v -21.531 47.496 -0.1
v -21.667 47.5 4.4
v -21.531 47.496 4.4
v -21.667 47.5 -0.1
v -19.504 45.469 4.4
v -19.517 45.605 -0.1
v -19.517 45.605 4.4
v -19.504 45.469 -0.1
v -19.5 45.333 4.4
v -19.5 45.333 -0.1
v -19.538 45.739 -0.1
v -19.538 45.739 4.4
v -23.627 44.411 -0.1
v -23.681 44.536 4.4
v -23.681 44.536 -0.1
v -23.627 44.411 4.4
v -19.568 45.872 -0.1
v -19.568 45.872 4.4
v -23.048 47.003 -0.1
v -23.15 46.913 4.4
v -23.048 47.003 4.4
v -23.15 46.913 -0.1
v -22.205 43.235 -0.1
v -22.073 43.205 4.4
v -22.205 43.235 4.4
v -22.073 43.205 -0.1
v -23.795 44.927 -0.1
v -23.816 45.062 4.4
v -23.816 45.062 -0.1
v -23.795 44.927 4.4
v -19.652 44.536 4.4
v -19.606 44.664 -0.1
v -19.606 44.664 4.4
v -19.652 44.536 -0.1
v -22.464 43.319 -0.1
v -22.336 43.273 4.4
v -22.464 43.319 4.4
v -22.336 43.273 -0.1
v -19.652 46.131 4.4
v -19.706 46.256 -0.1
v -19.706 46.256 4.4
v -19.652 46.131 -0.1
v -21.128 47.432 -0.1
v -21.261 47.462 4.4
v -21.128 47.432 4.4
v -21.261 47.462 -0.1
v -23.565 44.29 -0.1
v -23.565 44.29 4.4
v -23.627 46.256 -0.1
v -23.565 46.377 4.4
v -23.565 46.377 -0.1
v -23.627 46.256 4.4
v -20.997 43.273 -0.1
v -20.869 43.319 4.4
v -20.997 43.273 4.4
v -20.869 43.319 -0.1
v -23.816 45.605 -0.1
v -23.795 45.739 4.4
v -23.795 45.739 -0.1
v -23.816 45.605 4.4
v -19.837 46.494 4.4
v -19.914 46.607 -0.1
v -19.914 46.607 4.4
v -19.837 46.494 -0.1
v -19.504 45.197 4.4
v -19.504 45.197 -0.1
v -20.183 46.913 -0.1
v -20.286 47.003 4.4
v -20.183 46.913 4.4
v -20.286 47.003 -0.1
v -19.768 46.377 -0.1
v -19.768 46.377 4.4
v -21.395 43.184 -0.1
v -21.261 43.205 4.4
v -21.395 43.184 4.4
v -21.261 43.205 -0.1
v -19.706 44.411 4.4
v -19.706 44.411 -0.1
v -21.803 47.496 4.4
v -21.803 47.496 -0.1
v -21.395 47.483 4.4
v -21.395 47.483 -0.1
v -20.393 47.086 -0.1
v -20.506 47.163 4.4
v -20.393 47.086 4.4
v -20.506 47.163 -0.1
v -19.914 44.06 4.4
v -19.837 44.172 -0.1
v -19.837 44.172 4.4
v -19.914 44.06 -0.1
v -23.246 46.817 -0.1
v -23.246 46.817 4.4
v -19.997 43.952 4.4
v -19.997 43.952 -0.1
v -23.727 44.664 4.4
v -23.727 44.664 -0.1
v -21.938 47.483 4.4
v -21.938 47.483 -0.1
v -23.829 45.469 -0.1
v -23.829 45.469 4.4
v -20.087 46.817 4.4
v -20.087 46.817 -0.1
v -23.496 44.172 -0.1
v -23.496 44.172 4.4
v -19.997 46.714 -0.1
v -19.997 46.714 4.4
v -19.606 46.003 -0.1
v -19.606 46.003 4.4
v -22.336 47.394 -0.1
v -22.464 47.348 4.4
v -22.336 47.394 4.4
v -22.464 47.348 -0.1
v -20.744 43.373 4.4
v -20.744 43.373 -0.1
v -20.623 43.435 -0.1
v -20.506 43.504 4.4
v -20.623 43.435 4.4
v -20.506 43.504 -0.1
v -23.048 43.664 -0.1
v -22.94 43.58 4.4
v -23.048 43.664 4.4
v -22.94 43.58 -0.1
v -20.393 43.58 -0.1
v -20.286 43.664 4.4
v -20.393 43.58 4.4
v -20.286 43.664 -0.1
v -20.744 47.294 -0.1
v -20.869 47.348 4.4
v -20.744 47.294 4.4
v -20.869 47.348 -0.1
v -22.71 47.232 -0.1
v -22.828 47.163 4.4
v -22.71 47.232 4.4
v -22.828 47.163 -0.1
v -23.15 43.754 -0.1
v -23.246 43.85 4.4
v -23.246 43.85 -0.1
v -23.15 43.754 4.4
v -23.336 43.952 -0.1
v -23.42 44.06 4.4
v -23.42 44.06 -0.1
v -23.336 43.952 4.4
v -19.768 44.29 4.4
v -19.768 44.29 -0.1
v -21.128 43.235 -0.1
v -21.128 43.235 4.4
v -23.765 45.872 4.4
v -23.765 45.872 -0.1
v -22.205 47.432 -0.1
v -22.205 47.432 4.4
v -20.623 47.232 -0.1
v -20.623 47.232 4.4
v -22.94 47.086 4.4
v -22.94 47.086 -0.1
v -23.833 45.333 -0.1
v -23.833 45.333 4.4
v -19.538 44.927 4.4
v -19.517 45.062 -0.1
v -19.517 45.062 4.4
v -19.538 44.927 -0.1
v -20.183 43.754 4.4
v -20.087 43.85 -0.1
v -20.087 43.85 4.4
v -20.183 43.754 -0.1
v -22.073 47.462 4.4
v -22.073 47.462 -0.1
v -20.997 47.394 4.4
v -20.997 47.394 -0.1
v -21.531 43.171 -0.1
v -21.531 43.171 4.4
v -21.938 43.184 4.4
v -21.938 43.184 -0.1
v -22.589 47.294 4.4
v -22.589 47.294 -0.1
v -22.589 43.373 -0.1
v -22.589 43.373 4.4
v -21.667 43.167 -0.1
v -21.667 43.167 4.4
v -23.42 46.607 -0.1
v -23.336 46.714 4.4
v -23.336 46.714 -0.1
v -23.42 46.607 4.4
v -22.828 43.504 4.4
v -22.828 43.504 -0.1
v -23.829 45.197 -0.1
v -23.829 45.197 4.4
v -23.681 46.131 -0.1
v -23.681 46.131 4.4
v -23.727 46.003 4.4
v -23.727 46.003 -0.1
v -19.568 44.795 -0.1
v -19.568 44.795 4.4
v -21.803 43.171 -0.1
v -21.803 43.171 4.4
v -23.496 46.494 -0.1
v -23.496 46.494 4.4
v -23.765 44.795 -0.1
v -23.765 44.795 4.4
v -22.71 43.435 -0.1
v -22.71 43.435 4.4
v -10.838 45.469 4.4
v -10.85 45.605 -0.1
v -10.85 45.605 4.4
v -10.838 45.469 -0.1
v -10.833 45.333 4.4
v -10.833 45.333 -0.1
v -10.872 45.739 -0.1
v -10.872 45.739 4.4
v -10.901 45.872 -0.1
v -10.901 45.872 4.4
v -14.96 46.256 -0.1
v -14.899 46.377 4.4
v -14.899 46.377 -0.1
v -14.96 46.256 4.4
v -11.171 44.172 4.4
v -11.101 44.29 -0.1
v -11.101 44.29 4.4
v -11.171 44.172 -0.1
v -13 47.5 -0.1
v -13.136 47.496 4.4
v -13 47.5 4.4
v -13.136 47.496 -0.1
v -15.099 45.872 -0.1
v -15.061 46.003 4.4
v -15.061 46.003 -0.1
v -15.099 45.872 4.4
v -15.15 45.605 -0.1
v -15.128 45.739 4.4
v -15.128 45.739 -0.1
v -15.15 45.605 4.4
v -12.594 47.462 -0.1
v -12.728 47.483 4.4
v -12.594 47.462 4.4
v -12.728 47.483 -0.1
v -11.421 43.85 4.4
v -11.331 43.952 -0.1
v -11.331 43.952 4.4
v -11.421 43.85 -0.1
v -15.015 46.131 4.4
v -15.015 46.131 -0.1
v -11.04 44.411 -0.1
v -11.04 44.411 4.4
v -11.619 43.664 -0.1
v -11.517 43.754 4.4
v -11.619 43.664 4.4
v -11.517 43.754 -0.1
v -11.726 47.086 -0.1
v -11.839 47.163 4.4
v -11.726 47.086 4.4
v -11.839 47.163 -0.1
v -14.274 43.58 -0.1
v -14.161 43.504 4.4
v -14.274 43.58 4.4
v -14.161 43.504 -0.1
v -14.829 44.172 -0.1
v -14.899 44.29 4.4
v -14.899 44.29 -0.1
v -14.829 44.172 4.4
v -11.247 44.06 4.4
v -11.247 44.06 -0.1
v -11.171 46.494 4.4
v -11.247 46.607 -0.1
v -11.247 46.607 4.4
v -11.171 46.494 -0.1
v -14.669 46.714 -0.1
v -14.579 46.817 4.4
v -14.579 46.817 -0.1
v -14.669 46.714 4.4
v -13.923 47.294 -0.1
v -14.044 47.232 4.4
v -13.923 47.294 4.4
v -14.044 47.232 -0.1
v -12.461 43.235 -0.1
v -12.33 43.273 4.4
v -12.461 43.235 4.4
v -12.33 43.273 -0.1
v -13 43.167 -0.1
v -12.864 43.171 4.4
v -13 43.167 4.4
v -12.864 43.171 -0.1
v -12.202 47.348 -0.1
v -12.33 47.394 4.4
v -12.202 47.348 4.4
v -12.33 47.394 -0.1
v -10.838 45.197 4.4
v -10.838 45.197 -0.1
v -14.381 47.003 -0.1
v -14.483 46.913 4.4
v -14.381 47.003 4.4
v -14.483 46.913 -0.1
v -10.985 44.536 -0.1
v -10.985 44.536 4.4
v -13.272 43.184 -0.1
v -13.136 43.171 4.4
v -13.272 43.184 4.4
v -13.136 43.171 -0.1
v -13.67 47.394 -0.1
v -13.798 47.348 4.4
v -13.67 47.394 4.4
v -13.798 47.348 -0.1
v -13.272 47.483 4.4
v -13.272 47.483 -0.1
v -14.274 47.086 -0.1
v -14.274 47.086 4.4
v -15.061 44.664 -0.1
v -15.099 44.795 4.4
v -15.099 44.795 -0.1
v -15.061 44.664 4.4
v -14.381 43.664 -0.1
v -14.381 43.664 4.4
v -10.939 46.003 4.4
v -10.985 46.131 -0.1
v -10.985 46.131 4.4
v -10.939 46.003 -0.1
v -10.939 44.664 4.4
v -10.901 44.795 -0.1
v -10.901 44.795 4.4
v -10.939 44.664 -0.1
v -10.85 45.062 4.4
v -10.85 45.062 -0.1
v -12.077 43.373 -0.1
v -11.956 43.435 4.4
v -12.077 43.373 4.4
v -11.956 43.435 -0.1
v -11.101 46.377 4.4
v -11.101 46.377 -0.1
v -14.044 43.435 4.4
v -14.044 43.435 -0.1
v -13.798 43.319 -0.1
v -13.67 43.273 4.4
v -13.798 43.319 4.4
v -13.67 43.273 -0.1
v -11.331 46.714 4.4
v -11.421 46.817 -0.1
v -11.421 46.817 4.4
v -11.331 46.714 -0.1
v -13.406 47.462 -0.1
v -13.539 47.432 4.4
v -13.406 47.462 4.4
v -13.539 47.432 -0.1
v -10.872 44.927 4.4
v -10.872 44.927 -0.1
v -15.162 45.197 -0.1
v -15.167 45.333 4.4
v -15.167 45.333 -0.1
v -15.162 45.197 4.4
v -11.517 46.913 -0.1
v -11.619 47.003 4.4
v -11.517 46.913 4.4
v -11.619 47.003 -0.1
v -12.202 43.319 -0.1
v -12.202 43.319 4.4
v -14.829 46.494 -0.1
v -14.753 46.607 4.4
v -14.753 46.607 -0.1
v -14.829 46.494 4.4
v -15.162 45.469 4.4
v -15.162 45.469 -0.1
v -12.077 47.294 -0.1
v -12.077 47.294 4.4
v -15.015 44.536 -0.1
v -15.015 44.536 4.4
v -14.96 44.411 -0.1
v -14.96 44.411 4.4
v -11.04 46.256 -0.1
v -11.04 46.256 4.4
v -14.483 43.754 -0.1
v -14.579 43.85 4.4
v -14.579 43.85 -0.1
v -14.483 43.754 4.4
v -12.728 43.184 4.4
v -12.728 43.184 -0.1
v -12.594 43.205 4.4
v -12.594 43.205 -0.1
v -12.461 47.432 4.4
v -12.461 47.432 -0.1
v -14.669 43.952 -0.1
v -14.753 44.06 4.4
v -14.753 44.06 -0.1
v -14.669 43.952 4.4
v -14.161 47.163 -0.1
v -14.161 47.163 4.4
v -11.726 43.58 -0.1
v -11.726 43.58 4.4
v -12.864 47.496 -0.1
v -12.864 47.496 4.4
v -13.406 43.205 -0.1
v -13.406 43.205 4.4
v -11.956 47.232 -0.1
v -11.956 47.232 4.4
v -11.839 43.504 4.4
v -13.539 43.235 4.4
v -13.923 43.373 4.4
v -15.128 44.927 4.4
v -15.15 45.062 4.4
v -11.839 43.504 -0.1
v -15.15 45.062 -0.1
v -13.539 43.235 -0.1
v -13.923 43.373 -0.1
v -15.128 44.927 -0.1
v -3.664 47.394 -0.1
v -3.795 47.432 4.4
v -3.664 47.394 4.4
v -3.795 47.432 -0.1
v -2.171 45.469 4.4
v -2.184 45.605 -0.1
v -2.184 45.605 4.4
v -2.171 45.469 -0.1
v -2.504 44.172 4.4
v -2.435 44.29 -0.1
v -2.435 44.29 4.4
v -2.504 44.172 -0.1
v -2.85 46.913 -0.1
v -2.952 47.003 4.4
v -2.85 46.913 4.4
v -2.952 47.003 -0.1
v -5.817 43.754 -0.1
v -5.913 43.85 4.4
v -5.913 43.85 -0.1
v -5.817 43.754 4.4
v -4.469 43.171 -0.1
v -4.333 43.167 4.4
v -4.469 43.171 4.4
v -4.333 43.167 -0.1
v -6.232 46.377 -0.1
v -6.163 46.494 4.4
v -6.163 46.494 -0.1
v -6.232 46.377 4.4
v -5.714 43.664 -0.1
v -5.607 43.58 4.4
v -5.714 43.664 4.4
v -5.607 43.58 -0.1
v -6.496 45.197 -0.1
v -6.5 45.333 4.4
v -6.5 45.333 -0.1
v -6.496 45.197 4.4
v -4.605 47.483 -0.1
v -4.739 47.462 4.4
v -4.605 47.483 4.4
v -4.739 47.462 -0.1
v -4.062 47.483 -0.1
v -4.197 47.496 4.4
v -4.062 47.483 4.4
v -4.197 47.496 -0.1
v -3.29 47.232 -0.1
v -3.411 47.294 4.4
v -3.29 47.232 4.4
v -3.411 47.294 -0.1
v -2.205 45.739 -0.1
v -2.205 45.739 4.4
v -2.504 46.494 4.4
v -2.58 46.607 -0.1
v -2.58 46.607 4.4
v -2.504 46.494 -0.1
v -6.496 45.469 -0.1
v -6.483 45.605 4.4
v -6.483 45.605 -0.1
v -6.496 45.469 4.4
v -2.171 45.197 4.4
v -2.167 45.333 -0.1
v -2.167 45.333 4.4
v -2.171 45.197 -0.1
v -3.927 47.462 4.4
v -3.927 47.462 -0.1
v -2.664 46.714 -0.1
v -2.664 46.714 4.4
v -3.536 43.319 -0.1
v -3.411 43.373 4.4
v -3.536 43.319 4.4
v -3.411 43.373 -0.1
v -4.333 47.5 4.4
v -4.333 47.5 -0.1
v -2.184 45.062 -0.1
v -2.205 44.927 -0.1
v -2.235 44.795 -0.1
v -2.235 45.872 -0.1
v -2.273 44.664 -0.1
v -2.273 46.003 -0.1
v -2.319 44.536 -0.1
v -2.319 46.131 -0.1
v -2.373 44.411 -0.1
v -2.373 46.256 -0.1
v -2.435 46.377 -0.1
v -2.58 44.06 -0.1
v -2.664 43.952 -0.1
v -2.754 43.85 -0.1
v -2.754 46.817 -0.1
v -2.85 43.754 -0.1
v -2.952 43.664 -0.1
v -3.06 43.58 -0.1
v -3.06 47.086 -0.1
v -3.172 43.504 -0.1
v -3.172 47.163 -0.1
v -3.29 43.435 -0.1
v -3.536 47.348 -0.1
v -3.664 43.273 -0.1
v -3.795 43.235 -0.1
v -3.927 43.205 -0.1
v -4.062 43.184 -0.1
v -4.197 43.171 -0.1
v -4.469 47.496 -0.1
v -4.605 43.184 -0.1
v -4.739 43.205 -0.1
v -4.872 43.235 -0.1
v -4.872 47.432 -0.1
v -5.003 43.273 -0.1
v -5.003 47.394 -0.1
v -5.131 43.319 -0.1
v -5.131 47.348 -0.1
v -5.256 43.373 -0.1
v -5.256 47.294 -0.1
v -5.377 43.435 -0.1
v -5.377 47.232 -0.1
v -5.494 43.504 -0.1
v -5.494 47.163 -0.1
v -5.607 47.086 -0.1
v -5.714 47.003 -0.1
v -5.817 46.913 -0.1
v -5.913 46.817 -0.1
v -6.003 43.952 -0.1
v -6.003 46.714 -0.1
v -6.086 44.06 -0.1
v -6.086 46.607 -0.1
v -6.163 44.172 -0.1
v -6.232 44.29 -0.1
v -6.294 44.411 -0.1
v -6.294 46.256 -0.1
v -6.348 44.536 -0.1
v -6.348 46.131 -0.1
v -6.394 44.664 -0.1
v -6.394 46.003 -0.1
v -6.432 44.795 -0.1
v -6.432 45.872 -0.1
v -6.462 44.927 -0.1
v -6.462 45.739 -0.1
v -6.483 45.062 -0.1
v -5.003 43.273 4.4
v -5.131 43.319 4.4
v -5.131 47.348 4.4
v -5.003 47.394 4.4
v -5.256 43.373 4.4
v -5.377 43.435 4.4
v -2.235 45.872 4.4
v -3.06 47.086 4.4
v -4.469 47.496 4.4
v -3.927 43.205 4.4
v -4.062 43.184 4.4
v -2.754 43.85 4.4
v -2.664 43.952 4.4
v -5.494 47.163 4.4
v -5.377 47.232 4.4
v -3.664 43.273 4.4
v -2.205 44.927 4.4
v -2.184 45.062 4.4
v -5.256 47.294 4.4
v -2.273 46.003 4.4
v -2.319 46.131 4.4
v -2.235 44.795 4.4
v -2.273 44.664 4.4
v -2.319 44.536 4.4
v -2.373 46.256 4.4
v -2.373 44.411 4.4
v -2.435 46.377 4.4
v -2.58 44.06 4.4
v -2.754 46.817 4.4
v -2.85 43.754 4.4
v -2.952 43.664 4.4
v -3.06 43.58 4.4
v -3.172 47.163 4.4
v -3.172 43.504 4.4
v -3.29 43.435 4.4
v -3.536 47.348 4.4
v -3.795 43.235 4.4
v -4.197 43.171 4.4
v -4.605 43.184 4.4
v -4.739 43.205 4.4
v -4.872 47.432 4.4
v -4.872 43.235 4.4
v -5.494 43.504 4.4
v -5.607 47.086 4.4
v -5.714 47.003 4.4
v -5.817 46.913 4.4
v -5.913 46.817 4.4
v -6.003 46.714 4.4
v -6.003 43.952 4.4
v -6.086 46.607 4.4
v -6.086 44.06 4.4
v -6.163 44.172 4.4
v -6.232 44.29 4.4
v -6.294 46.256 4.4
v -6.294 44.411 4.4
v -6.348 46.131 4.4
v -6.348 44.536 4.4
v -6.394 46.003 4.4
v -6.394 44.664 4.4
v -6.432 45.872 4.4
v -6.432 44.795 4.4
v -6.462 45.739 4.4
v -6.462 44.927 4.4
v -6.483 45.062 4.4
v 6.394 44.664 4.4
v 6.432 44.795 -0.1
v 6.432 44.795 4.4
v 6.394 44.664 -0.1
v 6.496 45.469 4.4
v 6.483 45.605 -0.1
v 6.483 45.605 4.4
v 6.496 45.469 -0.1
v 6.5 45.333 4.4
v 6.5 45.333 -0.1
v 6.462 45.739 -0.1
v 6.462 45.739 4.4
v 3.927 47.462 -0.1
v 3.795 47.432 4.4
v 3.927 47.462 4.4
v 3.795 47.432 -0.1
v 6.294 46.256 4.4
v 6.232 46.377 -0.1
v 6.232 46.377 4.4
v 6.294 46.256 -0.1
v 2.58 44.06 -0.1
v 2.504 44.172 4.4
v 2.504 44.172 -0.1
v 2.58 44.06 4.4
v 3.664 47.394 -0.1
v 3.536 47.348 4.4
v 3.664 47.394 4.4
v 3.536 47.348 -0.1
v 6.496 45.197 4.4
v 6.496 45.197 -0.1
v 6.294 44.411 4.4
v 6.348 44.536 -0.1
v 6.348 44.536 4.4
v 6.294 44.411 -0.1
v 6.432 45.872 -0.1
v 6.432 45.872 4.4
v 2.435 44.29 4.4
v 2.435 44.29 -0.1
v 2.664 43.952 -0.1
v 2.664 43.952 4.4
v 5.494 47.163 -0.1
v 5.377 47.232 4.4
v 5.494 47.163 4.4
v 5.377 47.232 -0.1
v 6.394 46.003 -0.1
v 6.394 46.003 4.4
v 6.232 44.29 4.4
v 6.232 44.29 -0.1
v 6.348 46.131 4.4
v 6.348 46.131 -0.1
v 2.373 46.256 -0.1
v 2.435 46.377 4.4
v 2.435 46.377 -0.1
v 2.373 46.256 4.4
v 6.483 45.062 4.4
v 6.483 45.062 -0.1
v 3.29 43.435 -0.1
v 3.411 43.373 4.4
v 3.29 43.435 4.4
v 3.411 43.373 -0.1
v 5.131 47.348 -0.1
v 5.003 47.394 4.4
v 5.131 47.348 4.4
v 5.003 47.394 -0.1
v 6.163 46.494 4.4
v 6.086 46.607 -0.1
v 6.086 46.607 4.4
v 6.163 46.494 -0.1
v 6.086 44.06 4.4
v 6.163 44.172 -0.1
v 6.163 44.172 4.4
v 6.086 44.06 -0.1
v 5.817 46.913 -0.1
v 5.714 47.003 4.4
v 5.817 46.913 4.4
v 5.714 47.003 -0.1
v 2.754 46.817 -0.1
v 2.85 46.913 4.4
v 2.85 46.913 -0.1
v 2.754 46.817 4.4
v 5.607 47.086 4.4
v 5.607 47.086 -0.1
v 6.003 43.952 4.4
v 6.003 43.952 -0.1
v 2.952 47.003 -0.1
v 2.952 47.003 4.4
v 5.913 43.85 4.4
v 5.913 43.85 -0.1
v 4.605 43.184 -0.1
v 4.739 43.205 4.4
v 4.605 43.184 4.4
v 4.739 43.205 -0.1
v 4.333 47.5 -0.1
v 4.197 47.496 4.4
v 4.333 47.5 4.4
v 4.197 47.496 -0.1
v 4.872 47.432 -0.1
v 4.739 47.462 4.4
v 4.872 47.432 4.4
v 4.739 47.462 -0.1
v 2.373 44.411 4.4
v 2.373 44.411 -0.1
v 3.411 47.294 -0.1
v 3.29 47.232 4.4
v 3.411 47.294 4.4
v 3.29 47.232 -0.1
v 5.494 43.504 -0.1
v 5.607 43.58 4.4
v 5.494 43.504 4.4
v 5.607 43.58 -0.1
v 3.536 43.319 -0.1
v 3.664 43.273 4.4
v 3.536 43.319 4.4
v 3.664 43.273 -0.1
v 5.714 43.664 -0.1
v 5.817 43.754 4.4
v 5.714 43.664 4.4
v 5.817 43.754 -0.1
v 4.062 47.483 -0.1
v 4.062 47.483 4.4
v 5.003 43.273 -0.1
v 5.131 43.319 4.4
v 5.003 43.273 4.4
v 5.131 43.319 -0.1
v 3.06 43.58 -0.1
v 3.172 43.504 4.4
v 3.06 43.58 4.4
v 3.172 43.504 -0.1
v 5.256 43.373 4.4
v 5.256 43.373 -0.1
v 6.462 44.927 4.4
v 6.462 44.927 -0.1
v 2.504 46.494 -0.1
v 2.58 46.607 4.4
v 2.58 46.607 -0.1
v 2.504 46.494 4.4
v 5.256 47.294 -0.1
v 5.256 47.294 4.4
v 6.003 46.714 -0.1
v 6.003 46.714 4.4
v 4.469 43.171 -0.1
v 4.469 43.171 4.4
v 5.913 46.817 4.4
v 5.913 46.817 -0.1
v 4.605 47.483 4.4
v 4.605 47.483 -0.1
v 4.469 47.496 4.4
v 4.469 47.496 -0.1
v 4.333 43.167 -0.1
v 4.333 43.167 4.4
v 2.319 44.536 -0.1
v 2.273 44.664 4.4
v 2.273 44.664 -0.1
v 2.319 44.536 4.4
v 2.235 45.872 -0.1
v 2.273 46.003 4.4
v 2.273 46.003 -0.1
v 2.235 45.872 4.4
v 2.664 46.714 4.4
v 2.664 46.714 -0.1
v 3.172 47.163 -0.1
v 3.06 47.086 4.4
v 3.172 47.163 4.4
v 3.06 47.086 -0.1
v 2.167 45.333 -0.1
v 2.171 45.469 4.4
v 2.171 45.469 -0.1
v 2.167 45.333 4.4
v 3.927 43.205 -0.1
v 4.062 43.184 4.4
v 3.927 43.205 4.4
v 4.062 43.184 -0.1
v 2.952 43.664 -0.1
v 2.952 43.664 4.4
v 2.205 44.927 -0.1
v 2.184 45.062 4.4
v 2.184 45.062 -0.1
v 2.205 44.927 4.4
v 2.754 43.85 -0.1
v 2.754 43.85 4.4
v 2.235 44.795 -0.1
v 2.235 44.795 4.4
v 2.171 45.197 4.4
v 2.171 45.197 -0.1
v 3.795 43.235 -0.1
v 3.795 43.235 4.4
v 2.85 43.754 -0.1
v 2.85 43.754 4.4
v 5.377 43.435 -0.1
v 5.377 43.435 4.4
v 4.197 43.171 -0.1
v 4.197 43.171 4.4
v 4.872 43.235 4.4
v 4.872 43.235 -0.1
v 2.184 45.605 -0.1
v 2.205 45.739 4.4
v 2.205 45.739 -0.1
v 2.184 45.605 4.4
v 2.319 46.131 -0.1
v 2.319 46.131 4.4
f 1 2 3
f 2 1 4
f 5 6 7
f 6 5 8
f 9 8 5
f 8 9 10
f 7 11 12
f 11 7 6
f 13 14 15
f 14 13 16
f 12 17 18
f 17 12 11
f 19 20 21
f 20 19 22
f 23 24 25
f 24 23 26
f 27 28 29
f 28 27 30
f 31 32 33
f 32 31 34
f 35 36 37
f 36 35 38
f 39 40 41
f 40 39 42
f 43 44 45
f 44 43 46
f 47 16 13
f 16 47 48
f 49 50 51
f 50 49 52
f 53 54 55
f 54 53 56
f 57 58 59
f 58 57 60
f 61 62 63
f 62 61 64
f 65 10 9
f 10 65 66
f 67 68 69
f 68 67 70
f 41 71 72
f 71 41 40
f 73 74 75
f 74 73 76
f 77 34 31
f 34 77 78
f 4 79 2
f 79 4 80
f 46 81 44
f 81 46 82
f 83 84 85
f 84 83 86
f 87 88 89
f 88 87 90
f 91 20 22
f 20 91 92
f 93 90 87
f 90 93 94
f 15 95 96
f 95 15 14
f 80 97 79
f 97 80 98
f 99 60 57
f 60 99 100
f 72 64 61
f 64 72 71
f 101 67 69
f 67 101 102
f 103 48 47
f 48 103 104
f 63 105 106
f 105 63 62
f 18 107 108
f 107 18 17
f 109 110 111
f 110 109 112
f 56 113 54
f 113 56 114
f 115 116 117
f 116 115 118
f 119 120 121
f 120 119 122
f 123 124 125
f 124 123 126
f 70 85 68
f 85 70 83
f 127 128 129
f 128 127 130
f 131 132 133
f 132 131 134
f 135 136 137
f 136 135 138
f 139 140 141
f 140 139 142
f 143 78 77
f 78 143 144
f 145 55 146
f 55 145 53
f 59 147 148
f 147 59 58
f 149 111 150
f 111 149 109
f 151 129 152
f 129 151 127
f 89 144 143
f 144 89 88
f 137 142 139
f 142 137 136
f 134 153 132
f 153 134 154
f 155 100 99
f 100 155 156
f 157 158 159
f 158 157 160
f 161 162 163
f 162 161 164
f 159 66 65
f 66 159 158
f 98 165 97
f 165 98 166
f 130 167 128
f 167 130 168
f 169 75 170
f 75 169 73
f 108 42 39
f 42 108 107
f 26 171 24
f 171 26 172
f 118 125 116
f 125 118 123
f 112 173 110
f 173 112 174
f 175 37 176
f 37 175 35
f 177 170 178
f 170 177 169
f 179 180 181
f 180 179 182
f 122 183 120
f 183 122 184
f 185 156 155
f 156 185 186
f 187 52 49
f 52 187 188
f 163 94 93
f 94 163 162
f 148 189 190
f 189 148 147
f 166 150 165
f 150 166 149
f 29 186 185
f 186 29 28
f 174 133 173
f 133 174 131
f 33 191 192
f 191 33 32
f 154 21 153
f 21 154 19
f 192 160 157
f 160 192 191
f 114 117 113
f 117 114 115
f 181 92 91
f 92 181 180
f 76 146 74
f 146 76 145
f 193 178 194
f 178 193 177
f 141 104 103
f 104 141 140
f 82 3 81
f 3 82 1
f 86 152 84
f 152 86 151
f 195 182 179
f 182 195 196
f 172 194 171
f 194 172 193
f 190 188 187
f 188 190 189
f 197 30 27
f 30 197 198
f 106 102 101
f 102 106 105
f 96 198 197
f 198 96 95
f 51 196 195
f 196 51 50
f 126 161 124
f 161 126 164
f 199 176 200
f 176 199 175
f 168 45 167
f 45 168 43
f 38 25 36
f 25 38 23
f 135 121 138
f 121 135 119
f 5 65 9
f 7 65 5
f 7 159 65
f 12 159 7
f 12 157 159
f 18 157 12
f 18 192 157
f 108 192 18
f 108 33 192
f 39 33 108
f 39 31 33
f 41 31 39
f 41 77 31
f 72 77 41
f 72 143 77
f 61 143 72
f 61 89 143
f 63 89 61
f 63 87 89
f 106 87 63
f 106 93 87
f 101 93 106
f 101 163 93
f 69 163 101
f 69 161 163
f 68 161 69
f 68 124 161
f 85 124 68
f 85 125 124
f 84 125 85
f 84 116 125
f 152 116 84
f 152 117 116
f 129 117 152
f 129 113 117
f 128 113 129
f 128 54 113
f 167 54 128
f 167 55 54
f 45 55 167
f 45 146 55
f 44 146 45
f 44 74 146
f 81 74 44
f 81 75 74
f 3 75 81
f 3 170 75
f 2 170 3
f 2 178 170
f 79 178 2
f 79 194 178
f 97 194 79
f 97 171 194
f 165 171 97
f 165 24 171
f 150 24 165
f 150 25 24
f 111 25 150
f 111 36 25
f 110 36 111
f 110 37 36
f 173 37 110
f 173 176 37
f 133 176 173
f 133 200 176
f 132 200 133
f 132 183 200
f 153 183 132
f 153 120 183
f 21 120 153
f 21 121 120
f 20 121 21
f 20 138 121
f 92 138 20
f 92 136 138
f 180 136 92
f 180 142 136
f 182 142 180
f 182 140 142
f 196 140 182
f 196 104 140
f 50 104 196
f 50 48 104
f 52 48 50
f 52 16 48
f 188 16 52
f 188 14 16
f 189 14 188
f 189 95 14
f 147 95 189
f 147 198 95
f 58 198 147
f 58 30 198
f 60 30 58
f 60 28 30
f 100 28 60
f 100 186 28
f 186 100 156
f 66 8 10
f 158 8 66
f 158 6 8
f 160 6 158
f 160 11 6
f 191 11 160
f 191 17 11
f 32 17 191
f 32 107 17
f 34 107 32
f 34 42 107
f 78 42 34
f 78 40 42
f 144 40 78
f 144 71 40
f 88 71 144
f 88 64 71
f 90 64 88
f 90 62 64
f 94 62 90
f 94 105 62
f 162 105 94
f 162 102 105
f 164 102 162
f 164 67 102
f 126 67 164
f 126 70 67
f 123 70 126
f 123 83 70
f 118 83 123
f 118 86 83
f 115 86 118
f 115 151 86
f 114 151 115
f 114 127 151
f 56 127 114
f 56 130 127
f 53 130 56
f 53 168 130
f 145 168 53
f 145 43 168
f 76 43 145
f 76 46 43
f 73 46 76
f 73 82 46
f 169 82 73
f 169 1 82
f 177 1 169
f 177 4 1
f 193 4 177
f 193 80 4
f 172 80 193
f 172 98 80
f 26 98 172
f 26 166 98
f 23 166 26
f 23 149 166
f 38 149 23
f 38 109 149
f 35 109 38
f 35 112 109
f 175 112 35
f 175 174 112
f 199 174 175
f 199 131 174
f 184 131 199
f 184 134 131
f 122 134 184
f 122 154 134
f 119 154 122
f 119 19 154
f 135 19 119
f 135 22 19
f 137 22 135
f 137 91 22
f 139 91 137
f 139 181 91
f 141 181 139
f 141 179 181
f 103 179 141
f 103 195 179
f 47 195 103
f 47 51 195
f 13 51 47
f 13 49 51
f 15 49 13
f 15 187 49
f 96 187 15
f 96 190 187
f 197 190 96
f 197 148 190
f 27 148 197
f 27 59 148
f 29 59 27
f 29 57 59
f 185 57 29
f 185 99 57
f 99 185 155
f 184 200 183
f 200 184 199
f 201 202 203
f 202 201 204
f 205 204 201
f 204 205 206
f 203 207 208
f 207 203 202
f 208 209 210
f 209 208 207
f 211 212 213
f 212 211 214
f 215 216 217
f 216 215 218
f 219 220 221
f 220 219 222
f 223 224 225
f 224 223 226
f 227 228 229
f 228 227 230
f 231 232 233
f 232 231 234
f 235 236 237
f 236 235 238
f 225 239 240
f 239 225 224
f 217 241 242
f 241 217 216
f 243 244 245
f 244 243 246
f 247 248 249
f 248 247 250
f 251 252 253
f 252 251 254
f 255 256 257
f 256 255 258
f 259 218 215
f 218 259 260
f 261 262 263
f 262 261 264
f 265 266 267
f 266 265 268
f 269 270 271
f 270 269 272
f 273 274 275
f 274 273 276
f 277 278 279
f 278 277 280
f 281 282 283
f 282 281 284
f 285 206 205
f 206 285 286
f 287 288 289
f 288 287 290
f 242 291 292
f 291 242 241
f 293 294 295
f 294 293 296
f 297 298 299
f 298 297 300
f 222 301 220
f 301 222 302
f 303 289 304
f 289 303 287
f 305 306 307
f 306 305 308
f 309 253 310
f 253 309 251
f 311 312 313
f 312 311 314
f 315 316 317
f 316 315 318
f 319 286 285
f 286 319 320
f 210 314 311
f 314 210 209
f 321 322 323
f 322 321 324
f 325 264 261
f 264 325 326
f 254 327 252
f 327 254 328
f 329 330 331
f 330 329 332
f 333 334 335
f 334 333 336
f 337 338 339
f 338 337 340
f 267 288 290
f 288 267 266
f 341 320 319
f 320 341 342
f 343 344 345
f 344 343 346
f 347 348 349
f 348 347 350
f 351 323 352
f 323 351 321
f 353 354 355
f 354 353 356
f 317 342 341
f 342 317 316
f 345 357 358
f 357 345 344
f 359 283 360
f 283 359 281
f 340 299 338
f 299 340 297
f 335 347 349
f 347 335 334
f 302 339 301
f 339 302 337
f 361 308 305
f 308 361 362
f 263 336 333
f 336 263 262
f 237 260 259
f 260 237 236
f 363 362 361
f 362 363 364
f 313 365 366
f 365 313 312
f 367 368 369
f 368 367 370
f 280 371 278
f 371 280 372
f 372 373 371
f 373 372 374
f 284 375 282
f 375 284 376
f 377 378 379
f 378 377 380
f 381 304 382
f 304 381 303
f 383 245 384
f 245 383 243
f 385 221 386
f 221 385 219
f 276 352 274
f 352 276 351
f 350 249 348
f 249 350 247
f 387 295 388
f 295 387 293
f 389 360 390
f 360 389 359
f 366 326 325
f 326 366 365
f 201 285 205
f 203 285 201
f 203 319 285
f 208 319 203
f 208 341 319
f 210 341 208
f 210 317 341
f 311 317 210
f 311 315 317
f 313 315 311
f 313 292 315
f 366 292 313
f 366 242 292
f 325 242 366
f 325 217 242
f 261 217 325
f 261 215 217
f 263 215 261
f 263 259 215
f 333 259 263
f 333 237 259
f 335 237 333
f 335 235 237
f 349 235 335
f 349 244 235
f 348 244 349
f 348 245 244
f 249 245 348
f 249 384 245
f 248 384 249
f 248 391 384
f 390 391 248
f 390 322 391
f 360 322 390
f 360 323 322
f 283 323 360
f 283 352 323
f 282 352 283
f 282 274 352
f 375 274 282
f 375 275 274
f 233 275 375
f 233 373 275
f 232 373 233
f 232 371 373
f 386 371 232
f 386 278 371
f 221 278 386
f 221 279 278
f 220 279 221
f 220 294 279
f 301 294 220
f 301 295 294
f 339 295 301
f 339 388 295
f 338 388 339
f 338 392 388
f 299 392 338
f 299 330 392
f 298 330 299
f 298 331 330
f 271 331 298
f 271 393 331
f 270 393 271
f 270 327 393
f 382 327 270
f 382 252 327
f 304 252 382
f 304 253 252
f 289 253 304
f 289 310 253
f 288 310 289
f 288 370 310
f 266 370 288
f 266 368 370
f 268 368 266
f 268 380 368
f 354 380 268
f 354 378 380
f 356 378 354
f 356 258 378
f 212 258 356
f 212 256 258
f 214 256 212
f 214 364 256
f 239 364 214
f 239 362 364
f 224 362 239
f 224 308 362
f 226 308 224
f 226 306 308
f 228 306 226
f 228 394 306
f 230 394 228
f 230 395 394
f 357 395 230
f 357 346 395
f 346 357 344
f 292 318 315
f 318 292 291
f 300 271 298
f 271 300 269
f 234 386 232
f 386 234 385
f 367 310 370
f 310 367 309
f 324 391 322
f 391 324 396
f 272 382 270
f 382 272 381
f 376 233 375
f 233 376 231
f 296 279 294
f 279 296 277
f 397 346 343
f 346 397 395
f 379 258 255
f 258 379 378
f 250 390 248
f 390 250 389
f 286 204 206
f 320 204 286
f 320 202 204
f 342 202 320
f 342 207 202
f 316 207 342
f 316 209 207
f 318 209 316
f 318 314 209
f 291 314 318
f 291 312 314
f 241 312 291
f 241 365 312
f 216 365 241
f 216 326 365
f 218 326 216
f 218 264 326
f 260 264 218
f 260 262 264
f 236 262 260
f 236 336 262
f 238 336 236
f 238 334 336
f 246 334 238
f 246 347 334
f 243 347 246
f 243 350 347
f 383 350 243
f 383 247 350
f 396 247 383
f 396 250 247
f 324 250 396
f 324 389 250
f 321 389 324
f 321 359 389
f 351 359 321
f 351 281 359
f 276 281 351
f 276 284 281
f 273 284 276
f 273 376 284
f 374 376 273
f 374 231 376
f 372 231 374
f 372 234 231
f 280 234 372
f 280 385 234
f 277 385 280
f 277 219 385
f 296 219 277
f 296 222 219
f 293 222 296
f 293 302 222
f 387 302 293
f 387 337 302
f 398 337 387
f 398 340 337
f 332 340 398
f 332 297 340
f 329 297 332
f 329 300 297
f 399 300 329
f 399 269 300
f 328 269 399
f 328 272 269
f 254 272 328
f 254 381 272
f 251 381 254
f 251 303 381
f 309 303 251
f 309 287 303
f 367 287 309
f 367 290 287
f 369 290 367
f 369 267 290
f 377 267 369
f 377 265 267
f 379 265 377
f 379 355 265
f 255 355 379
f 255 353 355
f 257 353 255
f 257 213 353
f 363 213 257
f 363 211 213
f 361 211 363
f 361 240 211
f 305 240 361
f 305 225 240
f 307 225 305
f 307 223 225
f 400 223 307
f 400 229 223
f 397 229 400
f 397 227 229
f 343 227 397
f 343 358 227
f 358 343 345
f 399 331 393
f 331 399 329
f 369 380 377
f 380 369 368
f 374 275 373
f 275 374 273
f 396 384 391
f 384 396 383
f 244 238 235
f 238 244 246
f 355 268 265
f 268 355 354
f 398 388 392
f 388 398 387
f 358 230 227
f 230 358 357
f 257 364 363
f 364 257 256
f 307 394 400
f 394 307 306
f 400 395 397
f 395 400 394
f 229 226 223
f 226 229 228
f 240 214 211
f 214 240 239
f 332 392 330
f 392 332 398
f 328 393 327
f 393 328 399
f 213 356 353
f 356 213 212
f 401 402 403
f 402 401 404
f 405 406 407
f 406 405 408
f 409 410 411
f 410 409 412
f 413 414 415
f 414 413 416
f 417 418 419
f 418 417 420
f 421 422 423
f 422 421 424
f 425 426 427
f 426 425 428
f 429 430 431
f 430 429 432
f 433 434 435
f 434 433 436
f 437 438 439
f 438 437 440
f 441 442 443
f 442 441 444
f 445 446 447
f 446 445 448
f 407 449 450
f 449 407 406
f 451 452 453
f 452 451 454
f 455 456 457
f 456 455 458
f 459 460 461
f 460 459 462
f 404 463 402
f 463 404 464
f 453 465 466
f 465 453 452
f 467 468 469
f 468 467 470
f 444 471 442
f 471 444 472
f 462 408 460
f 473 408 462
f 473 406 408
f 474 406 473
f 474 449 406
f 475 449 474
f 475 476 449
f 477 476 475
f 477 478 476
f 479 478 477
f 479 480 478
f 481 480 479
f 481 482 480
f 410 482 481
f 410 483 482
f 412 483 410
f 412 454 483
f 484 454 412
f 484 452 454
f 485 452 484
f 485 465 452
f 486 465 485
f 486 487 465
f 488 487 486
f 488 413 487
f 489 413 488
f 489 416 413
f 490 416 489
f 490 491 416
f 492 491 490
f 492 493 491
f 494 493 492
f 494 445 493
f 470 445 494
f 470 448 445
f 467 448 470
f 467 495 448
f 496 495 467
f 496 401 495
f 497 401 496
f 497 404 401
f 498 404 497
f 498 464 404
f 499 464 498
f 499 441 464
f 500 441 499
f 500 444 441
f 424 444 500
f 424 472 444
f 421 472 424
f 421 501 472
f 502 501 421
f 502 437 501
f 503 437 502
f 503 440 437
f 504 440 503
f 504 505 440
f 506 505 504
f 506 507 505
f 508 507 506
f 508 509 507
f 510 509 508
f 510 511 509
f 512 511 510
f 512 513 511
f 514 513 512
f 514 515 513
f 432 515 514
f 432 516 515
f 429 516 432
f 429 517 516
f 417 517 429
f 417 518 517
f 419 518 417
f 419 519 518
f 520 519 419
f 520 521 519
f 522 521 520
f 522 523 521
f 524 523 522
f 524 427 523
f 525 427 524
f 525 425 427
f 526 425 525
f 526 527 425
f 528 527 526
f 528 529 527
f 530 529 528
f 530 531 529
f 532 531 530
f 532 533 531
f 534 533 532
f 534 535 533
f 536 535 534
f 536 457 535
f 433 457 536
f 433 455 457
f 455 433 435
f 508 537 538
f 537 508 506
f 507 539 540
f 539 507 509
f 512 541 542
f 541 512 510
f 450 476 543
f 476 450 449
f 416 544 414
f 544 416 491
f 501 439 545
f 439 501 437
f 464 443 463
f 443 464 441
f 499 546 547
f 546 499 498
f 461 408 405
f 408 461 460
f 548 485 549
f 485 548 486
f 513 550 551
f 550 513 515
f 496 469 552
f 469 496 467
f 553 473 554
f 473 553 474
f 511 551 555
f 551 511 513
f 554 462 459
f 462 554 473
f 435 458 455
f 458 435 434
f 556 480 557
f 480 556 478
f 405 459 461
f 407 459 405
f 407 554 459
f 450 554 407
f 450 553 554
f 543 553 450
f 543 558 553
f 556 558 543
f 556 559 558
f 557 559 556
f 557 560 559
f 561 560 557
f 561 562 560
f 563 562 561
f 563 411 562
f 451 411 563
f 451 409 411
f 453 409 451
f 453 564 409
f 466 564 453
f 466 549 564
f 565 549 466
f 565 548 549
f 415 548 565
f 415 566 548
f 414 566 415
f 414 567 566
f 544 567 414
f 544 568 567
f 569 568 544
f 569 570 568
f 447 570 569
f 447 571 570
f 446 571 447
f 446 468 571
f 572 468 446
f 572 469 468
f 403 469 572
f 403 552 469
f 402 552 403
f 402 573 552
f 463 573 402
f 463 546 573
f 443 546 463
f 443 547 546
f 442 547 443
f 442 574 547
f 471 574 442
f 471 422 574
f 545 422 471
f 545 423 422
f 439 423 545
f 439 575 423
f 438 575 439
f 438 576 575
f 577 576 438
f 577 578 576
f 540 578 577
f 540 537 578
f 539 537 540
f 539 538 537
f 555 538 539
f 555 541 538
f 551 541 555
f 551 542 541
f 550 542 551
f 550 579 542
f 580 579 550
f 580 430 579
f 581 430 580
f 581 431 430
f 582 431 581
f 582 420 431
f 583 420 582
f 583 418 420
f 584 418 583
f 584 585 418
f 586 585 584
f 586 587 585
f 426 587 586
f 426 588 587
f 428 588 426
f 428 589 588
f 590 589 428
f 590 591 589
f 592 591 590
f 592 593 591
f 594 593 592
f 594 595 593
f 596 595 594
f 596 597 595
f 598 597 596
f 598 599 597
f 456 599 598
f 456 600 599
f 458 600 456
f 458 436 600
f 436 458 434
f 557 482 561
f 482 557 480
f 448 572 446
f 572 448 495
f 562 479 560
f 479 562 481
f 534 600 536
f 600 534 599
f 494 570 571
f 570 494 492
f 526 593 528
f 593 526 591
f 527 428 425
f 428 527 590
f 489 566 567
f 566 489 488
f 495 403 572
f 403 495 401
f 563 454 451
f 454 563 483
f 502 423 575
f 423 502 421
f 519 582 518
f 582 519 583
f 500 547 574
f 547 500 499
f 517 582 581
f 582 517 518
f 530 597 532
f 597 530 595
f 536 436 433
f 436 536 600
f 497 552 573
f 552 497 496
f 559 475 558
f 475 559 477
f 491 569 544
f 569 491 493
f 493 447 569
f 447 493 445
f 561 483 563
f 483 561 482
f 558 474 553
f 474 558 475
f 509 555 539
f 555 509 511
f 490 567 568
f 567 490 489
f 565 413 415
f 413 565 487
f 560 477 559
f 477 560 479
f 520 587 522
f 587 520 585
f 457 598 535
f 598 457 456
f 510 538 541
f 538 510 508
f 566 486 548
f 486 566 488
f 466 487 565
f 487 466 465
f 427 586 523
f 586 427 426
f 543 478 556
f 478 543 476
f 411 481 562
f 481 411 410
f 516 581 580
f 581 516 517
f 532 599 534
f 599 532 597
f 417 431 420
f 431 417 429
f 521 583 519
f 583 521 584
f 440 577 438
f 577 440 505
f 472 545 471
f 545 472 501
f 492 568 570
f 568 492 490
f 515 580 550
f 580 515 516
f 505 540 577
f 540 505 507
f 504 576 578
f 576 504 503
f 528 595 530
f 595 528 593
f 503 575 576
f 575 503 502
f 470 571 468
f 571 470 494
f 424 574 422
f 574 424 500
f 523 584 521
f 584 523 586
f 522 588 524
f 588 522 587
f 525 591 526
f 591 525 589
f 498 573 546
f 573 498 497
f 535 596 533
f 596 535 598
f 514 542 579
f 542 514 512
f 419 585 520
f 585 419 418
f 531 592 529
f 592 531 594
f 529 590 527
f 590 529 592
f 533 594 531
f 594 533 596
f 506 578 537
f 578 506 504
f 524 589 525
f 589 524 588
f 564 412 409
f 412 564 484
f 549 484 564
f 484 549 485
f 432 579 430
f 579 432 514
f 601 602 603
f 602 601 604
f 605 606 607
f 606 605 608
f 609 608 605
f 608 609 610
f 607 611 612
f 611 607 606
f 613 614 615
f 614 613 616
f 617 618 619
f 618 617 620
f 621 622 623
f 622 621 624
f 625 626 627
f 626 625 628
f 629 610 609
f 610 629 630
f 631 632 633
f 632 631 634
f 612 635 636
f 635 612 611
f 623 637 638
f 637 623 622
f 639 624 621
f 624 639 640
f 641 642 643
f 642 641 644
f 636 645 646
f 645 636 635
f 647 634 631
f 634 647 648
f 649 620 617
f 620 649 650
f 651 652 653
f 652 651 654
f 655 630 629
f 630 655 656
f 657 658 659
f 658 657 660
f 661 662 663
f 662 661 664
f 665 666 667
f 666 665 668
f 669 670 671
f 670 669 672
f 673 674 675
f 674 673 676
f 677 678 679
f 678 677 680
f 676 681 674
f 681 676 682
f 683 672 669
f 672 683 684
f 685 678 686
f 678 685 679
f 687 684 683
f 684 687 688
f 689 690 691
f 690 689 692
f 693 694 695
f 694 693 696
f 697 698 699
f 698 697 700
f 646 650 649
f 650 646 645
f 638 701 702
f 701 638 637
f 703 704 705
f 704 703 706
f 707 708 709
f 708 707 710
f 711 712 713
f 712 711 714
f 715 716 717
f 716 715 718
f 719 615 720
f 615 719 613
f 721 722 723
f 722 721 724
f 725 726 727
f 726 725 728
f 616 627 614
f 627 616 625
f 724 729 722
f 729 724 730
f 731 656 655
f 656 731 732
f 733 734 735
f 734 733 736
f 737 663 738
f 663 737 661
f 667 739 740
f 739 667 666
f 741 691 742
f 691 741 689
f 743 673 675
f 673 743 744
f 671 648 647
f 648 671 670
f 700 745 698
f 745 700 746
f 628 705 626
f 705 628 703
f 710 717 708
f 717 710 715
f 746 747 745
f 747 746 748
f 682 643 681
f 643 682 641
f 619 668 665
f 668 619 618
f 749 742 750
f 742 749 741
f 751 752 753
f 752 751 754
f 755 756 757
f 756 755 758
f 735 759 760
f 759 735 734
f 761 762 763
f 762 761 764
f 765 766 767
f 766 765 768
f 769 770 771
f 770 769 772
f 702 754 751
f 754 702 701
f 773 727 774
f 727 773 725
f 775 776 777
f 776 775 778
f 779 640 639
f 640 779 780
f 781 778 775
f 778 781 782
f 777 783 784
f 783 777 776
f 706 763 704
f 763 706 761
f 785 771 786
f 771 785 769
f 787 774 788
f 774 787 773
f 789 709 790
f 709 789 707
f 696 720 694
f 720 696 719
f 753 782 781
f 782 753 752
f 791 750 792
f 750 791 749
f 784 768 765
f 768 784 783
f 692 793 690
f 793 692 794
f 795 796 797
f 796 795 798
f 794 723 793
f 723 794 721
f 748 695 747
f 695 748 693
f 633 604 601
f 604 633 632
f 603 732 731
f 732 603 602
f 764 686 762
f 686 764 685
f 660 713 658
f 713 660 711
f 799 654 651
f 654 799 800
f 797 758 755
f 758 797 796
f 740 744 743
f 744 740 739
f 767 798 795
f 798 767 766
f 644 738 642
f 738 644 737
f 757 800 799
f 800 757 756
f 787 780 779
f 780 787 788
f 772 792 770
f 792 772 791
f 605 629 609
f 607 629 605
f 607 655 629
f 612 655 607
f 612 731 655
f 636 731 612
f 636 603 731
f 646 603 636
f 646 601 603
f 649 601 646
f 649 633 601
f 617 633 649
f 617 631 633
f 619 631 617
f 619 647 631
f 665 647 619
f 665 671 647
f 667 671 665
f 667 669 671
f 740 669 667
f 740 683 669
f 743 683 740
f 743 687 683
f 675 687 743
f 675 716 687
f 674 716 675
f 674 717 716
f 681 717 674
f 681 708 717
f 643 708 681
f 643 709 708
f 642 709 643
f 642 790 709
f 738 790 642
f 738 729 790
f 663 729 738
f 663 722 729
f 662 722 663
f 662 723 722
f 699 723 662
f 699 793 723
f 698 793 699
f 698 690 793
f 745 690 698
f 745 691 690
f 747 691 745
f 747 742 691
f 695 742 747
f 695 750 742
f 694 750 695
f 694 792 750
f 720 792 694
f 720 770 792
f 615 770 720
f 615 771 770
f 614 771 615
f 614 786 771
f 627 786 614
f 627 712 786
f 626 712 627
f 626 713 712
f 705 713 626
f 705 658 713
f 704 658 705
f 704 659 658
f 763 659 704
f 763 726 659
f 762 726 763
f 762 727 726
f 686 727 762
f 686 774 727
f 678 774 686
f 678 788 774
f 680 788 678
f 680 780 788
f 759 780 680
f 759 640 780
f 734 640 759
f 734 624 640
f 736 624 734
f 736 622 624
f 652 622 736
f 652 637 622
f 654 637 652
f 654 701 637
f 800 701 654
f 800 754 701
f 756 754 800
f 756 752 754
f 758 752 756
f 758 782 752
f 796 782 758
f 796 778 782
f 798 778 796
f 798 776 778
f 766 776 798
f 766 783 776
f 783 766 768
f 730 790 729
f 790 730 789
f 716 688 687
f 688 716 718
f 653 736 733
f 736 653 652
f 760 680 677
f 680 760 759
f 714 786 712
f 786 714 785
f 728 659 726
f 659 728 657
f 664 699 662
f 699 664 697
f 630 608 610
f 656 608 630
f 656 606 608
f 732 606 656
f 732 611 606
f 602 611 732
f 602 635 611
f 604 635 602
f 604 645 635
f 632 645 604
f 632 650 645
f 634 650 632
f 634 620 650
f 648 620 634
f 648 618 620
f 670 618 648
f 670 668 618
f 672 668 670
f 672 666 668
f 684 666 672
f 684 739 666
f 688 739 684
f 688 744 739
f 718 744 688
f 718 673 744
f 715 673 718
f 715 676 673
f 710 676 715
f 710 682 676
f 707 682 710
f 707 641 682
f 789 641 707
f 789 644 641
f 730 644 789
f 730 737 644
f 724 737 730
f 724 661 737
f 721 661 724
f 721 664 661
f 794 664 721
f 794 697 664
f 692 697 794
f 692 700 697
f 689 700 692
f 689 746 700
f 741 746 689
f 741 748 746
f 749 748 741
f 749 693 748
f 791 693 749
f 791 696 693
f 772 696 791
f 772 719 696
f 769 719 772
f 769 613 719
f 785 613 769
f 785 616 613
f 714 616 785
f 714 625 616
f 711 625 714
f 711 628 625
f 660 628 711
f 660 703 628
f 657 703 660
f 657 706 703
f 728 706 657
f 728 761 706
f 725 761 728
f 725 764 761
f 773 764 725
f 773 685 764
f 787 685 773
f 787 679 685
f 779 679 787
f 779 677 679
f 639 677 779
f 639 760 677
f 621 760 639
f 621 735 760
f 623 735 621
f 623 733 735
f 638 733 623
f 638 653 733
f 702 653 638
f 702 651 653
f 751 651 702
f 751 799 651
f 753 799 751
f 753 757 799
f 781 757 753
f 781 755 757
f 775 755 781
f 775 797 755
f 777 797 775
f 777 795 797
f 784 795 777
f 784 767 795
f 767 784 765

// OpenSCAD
$fn=100;
fit=0.3;

//sabonete=[95,55];
//sabonete=[100,60]; //Claudia
sabonete=[80,50];  //Gabi
sl=sabonete[0];
sw=sabonete[1];
l=sl+2;
w=sw+2; 
pos=1;

h=3;
div=6;
slot=4;
t=(l/div)-slot;
echo("T: ");
echo(t);
/*********/
v=l-(t*div);
//slot=v/(div-1);
s=t+slot;
bh=4;
bw=8;
bl=l-t;
td=0; //top dif
c=25; //top curve
echo(slot);
fh=3;
dw=w/2-w/6-bw/2;
dl=s*2+t;
print=1;

// Sabonete
//%translate([-sw/2, -sl/2, h*3]) cube([sw,sl,20]);

//color([.6,1,0.6])
/**
color("orange")
if(print == 1){ 
    saboneteira6();
}else{    
    translate([0,0,fh]) 
    saboneteira6();
}
saboneteira4();
/**/
foot();

module saboneteira4(){
    v=l-(t*div);
    slot=v/(div-1);
    s=t+slot;
    bh=2.5;
    bw=6;
    bl=l-t;
    td=0; //top dif
    echo(slot);
    dw=w/2-w/6-t/4-fit;
    dl=s*2+t;
    
    difference(){
        union(){
            for(i=[-1,1]){
                translate([i*dw-bw/2,-l/2+t/2,0])
                trapezy(bw,bw/2,bl,bh);
            }
            
            for(i=[0:div-1]){
                p=-l/2+s*i;
                translate([-w/2,p,0])
                //trapezx(w,t,t-td,h);
                rcube(w,t,h,.5);
            }
            
        }
        /****************************/
        for(a=[ [-1,-1], [-1,1], [1,-1], [1,1] ] ){
            translate([a[0]*dw, a[1]*l/2-a[1]*(s+t/2), -.1])
            cylinder(d=t/2+fit, h=h/2);
        }
    }    
}

module rcube(length,width,height,r=.5){ 
    l=length-2*r;
    w=width-2*r;    
    translate([r,r,0]){
        cylinder(r=r,h=height);    
        translate([0,w,0])
        cylinder(r=r,h=height);    
        translate([l,0,0])
        cylinder(r=r,h=height);    
        translate([l,w,0])
        cylinder(r=r,h=height);    
    }
    // Inner cubes
    translate([0,r,0])
    cube([length,w,height]);
    translate([r,0,0])
    cube([l,width,height]);
}

module trapezx(x,y1,y2,z){
    hull(){
        cube([x,y1,.1]);

        translate([0,(y1-y2)/2,z])
        cube([x,y2,.1]);
    }    
}
module trapezy(x1,x2,y,z){
    translate([x1,0,0])
    rotate([0,0,90])
    trapezx(y,x1,x2,z);
}

module foot(){
    t=(w/div);
    if(print == 1){ 
        for(a=[ 0,1,2,3 ] ){
            translate([-w/2+t/2+a*t, l/2+t/2, -.1])
            cylinder(d=t/2, h=h/2+fh);
        }
    }else{
        for(a=[ [-1,-1], [-1,1], [1,-1], [1,1] ] ){
            translate([a[0]*dw, a[1]*(s+t/2), -.1])
            cylinder(d=t/2, h=h/2+fh);
        }
    }
}
module foot6(){
    t=(w/div);
    if(print == 1){ 
        for(a=[ 0,1,2,3 ] ){
            translate([-w/2+t+a*t*1.25, l/2+t/2, -.1])
            cylinder(d=t/2, h=h/2+fh);
        }
    }else{
        for(a=[ [-1,-1], [-1,1], [1,-1], [1,1] ] ){
            translate([(a[0]*t*2)-(a[0]*t/2)-.4, a[1]*(l/3), -.1])
            cylinder(d=t/2, h=h/2+fh);
        }
    }
}

module saboneteira6(){
  tipo=2;
  t=(w/div);
  dw=3.2;
  dl=25;
  sr=l;
    
  intersection(){
    translate([0,0,sr-13])    sphere(sr);
    
    difference(){
        union(){
            // base
            translate([-w/2,-l/2,0])
            trapezx(w-.8,l,l,bh);

            for(i=[0:div-1]){
                p=-w/2+t*i;
                translate([p,-l/2,0]){
                    if(tipo==2){
                        translate([0,0,h])
                        trapezy(t-.8,0.8,l,t/2);
                    }
                }
            }
            
        }
        /****************************/
        // Foot Holes
        for(a=[ [-1,-1], [-1,1], [1,-1], [1,1] ] ){
                        translate([(a[0]*t*2)-(a[0]*t/2)-.4, a[1]*(l/3), -.1])
            cylinder(d=t/2+.5, h=h/2);
        }
        
        // Drain
        for(i=[0:div-2]){
            p=-w/2+t*i-dw/2+.8;
            translate([p,0,0]){
                if(tipo==2){
                    translate([t-1.2, l/4-dl/3*2-2,-.1])
                    rcube(dw, dl, h*2, 0.8);

                    translate([t-1.2, -l/4-dl/3+2,-.1])
                    rcube(dw, dl, h*2, 0.8);
                }
            }
        }
    }    
}
}
module saboneteira5(){
  tipo=2;
  
  intersection(){
    translate([0,0,l*4-bh/2])
    sphere(l*4);
    
    difference(){
        union(){
            // base
            difference(){
              union(){
                translate([-w/2+w/6,-l/2+t/2,0])
                trapezy(bw,bw,bl,bh);
                //rotate([-90,0,0]) cylinder(d=bw, h=bl);
                
                translate([w/2-bw-w/6,-l/2+t/2,0])
                trapezy(bw,bw,bl,bh);
                //translate([w/2-w/4,-l/2+t/2,0])
                //rotate([-90,0,0]) cylinder(d=bw, h=bl);
              }
              
              translate([-w/2,-l/2,-h])
              cube([w,l,h]);
            }
            
            for(i=[0:div-1]){
                p=-l/2+s*i;
                translate([-w/2,p+slot/2,0]){
                    trapezx(w,t,t-td,h);
                    
                    if(tipo==2){
                        translate([0,0,h])
                        trapezx(w,t/2-slot/2,.8,t/4);
                        translate([0,t/2+slot/2,h])
                        trapezx(w,t/2-slot/2,.8,t/4);
                    }
                }
            }
            
        }
        /****************************/
        for(a=[ [-1,-1], [-1,1], [1,-1], [1,1] ] ){
            translate([a[0]*dw, a[1]*(s+t/2+slot/2), -.1])
            cylinder(d=t/2+.5, h=h/2);
        }
    }    
}
}


module saboneteira3(){
    v=l-(t*div);
    slot=v/(div-1);
    s=t+slot;
    bh=3;
    bw=6;
    bl=l-t;
    
    difference(){
        union(){
            translate([-w/2+t,-l/2+t/2,0])
            cube([bw,bl,bh]);
            
            translate([w/2-t-bw,-l/2+t/2,0])
            cube([bw,bl,bh]);

            for(i=[0:div-1]){
                p=-l/2+s*i;
                translate([-w/2,0,0])
                hull(){
                    translate([0,p,0])
                    cube([.1,t,h]);

                    translate([w,p,0])
                    cube([.1,t,h]);
                }
                /*overhang
                translate([-w/2,t/2,0])
                hull(){
                    translate([t,p,bh-t])
                    cube([t,t,.1]);

                    translate([0,p,bh])
                    cube([t,t,.1]);
                }
                translate([-w/2,t/2,0])
                hull(){
                    translate([w-t*2,p,bh-t])
                    cube([t,t,.1]);

                    translate([w-t,p,bh])
                    cube([t,t,.1]);
                }
                /**/
            }
            
        }
        /****************************/
        dw=w/2-t-bw/2;
        dl=s*2+t;
        for(a=[ [-1,-1], [-1,1], [1,-1], [1,1] ] ){
            translate([a[0]*dw, a[1]*l/2-a[1]*(s+t/2), -.1])
            cylinder(d=t/2+.5, h=h/2);
        }
    }    
}

module saboneteira2(){
    s=(l)/(div);
    bh=5;
    bw=10;
    bl=l;
    
    difference(){
        union(){
            translate([-w/2+t*2,-l/2,0])
            cube([bw,bl,bh]);
            
            translate([w/2-t*2-bw,-l/2,-.1])
            cube([bw,bl,bh]);

            for(i=[0:div-1]){
                //-l/2+t/2+s:s:l/2-t*2
                p=-l/2+t+s*i;
                translate([-w/2,t/2,bh])
                hull(){
                    translate([0,p,0])
                    cube([.1,t,h]);

                    translate([w,p,0])
                    cube([.1,t,h]);
                }
                /*overhang
                translate([-w/2,t/2,0])
                hull(){
                    translate([t,p,bh-t])
                    cube([t,t,.1]);

                    translate([0,p,bh])
                    cube([t,t,.1]);
                }
                translate([-w/2,t/2,0])
                hull(){
                    translate([w-t*2,p,bh-t])
                    cube([t,t,.1]);

                    translate([w-t,p,bh])
                    cube([t,t,.1]);
                }
                /**/
            }
        }
        /****************************/
        
    }    
}

module saboneteira1(){
    s=(l-t)/(div);
    
    difference(){
        union(){
            /**/
            difference(){
                translate([-w/2,-l/2,0])
                rcube(w,l,h+t/2,2);
                
                translate([-w/2+t,-l/2+t,-.1])
                rcube(w-t*2,l-t*2,h+t+1,1);
            }
            /**/  
            for(i=[0:div-1]){
                //-l/2+t/2+s:s:l/2-t*2
                p=-l/2+t/2+s*i;
                translate([-w/2,-t/2,0]){
                    hull(){
                        translate([0,p,0])
                        cube([.1,t,h]);

                        translate([w,p+s,0])
                        cube([.1,t,h]);
                    }
                }
                /*
                hull(){
                    translate([0,p,0])
                    cube([.1,t,h]);

                    translate([w,p-s,0])
                    cube([.1,t,h]);
                }
                /**/
            }
        }
        
        
         /* */  
        hull(){
            translate([-sw/3,0,0])
            rotate([0,45,0])
            cube([1,l*2,h],true);
            
            translate([sw/3,0,0])
            rotate([0,-45,0])
            cube([1,l*2,h],true);
        }
        /**/
    }    
}

module saboneteira(){
    s=(l-t)/(div+1);
    
    difference(){
        union(){
            /**/
            difference(){
                translate([-w/2,-l/2,0])
                rcube(w,l,h+t/2,2);
                
                translate([-w/2+t,-l/2+t,-.1])
                rcube(w-t*2,l-t*2,h+t+1,1);
            }
            /**/  
            for(i=[-l/2+t/2+s:s:l/2-t*2]){
                translate([0,i,0])
                translate([-w/2,-t/2,0])
                cube([w,t,h]);
            }
        }
            
        hull(){
            translate([-sw/3,0,0])
            rotate([0,45,0])
            cube([1,l*2,h],true);
            
            translate([sw/3,0,0])
            rotate([0,-45,0])
            cube([1,l*2,h],true);
        }
    }    
}

module rcube(length,width,height,radius=.5){    
    l=length-2*radius;
    w=width-2*radius;
    translate([radius,radius,0])
    hull(){
        cylinder(r=radius,h=height);    
        translate([0,w,0])
        cylinder(r=radius,h=height);    
        translate([l,0,0])
        cylinder(r=radius,h=height);    
        translate([l,w,0])
        cylinder(r=radius,h=height);    
    }
}
